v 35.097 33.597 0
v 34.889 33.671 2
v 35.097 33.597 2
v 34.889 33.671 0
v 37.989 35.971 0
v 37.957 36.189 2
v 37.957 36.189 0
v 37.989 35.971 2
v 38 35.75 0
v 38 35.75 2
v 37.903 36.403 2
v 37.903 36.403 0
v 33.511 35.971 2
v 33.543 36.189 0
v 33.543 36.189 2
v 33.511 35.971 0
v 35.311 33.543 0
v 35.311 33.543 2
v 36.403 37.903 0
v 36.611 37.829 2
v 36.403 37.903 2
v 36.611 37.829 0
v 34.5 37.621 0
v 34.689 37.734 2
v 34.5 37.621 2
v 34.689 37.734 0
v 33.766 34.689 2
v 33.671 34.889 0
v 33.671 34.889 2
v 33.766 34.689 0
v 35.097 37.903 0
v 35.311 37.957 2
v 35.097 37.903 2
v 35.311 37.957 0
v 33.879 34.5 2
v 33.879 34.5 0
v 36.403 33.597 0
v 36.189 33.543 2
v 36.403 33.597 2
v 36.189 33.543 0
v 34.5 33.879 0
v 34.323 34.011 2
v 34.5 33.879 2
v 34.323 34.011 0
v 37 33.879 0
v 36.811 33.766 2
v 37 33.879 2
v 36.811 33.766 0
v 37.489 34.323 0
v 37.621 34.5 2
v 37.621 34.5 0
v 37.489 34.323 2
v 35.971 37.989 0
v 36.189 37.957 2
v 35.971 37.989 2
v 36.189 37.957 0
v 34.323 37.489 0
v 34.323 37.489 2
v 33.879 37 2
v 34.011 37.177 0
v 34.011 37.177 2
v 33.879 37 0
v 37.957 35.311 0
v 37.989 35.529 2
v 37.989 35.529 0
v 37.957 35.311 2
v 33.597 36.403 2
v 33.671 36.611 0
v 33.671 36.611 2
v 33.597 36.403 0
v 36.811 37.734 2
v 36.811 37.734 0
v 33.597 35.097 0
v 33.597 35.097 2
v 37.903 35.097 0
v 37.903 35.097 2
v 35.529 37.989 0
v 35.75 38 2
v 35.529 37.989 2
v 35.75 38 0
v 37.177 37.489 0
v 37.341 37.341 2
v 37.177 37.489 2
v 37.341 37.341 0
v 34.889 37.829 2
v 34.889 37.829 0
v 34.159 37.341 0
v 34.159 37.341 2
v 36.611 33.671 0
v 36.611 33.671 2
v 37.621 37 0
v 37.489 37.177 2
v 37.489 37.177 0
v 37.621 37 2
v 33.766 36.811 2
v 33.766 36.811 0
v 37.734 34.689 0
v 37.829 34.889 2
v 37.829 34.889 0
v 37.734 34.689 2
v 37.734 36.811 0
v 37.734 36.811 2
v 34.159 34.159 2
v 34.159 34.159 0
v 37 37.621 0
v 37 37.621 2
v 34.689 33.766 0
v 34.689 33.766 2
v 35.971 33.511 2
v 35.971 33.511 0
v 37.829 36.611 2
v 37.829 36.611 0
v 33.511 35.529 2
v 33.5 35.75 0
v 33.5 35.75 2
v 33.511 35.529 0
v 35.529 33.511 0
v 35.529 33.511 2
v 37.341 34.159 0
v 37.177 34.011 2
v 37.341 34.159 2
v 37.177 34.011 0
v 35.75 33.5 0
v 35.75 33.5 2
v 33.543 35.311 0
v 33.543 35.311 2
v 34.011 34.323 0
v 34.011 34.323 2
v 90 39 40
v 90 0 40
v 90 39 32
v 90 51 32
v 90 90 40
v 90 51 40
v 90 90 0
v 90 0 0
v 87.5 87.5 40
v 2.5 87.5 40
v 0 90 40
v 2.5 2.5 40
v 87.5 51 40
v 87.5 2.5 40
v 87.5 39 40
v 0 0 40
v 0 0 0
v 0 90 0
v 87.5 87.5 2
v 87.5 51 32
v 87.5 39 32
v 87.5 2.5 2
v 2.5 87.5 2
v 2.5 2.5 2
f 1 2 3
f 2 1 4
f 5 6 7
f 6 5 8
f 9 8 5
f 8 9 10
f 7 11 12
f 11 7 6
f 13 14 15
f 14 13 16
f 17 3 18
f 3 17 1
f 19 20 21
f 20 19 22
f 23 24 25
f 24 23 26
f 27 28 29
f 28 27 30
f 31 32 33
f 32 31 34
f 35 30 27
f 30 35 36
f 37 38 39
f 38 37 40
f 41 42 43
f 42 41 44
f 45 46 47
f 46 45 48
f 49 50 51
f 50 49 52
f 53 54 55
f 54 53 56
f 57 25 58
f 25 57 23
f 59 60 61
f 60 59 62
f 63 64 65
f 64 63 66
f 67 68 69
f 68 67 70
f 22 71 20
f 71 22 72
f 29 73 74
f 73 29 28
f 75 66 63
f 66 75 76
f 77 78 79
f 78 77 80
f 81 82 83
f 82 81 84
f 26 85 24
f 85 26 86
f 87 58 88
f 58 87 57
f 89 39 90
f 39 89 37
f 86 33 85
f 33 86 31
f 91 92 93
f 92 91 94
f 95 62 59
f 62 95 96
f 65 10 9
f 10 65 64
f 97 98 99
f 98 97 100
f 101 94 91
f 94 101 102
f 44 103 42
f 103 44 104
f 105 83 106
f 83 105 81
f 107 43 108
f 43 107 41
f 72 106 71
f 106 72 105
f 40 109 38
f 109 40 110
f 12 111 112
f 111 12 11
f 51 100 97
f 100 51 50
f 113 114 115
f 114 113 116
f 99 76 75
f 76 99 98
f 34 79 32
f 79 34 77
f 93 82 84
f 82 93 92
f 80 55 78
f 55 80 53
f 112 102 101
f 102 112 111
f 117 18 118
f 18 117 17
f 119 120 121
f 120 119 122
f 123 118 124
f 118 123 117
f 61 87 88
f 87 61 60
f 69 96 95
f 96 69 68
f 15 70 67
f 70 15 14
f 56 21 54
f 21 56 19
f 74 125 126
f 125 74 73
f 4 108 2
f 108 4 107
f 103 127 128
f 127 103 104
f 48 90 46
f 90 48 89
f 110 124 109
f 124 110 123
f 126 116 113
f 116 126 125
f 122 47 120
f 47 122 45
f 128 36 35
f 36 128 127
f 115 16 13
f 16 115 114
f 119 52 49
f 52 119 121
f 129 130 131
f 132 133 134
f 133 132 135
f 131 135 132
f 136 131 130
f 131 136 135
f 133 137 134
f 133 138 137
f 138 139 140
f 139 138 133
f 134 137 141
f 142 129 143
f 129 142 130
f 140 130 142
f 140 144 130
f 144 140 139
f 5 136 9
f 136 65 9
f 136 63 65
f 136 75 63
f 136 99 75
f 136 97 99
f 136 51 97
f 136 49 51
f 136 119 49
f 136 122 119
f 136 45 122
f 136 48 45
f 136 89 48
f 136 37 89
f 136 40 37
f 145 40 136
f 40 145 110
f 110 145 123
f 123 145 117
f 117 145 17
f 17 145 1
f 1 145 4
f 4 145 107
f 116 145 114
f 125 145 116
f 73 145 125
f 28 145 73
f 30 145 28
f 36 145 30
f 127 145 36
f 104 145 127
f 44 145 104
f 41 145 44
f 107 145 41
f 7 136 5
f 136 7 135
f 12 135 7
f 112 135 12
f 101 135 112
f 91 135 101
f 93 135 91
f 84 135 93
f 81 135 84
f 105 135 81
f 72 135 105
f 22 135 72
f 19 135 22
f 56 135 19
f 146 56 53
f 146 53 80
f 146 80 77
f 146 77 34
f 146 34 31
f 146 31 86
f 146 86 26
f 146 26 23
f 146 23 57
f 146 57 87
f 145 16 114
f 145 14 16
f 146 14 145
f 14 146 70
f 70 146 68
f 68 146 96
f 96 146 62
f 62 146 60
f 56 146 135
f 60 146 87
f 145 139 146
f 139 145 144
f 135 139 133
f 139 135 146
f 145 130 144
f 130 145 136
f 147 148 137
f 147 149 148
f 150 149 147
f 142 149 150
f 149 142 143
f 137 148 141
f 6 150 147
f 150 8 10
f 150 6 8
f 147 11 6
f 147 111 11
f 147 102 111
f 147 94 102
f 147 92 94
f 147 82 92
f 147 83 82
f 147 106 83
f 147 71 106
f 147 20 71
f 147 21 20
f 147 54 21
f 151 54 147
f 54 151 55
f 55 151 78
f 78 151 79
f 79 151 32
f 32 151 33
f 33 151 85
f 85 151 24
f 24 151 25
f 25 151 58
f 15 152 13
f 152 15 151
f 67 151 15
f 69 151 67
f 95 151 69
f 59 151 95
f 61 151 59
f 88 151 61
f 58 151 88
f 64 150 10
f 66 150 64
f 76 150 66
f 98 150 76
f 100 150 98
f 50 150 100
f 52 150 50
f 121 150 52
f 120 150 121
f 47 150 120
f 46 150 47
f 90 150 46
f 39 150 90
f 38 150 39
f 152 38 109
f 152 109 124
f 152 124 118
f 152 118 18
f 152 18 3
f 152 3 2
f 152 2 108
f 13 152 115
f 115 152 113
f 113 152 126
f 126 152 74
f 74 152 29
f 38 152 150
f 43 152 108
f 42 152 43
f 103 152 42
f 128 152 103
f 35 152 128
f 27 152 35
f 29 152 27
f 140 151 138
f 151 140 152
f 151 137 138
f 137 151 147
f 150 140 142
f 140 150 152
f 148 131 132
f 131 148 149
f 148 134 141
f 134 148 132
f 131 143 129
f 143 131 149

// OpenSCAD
// DIY Magnetic Stirrer Housing
// Designed for an 80mm PC fan.
// Orientation: Printed upside-down (top plate on bed at z=0).

// --- Dimensions ---
outer_size   = 90.0;      // Outer width and length (mm)
top_thick    = 2.0;       // Thickness of the top plate (mm)
wall_thick   = 2.5;       // Thickness of the side walls (mm)
total_height = 40.0;      // Total height from top plate to open edge (mm)
hole_dia     = 4.5;       // Diameter for M4 screw holes (mm)
hole_pattern = 71.5;      // Square pattern for fan mounting holes (mm)
notch_w      = 12.0;      // Width of the cable notch (mm)
notch_h      = 8.0;       // Depth of the notch from the open edge (mm)

$fn = 64;

// --- Geometry ---

// We build the solid block and subtract the hollow parts and holes.
// To ensure the plate sits at Z=0, we build everything from Z=0 upwards.

difference() {
    // 1. THE SOLID OUTER SHELL
    // A single block representing the outer boundary of the box.
    cube([outer_size, outer_size, total_height]);

    // 2. THE INNER HOLLOW CAVITY
    // This creates the walls. The cavity starts at the top of the plate (Z = top_thick)
    // and goes to the top of the box (Z = total_height).
    translate([wall_thick, wall_thick, top_thick])
        cube([outer_size - 2 * wall_thick, outer_size - 2 * wall_thick, total_height]);

    // 3. THE FOUR SCREW HOLES
    // Holes are drilled through the top plate (Z=0 to Z=top_thick).
    // Pattern is centered on the plate.
    for (sx = [-1, 1], sy = [-1, 1]) {
        translate([sx * hole_pattern / 2, sy * hole_pattern / 2, -1])
            cylinder(h = top_thick + 2, d = hole_dia);
    }

    // 4. THE CABLE NOTCH
    // Located in one wall, centered along the wall.
    // Reaches 8mm down from the open edge (Z = total_height - notch_h).
    // We place it on the wall at Y = outer_size.
    // The notch is 12mm wide (X) and 8mm deep (Z).
    // To ensure a clean cut, we make the notch slightly wider in Y.
    translate([outer_size - wall_thick, outer_size / 2 - notch_w / 2, total_height - notch_h])
        cube([wall_thick + 2, notch_w, notch_h + 0.1]);
}

// Note: The part is centered in X and Y by default if we use cube([s,s,h]) 
// and don't use center=true. To match the user's request for centering:
// We wrap the whole thing in a translation to center it on X and Y.

// Re-applying centering logic to the final structure:
// (The code above is the logic; the block below is the final centered version)
